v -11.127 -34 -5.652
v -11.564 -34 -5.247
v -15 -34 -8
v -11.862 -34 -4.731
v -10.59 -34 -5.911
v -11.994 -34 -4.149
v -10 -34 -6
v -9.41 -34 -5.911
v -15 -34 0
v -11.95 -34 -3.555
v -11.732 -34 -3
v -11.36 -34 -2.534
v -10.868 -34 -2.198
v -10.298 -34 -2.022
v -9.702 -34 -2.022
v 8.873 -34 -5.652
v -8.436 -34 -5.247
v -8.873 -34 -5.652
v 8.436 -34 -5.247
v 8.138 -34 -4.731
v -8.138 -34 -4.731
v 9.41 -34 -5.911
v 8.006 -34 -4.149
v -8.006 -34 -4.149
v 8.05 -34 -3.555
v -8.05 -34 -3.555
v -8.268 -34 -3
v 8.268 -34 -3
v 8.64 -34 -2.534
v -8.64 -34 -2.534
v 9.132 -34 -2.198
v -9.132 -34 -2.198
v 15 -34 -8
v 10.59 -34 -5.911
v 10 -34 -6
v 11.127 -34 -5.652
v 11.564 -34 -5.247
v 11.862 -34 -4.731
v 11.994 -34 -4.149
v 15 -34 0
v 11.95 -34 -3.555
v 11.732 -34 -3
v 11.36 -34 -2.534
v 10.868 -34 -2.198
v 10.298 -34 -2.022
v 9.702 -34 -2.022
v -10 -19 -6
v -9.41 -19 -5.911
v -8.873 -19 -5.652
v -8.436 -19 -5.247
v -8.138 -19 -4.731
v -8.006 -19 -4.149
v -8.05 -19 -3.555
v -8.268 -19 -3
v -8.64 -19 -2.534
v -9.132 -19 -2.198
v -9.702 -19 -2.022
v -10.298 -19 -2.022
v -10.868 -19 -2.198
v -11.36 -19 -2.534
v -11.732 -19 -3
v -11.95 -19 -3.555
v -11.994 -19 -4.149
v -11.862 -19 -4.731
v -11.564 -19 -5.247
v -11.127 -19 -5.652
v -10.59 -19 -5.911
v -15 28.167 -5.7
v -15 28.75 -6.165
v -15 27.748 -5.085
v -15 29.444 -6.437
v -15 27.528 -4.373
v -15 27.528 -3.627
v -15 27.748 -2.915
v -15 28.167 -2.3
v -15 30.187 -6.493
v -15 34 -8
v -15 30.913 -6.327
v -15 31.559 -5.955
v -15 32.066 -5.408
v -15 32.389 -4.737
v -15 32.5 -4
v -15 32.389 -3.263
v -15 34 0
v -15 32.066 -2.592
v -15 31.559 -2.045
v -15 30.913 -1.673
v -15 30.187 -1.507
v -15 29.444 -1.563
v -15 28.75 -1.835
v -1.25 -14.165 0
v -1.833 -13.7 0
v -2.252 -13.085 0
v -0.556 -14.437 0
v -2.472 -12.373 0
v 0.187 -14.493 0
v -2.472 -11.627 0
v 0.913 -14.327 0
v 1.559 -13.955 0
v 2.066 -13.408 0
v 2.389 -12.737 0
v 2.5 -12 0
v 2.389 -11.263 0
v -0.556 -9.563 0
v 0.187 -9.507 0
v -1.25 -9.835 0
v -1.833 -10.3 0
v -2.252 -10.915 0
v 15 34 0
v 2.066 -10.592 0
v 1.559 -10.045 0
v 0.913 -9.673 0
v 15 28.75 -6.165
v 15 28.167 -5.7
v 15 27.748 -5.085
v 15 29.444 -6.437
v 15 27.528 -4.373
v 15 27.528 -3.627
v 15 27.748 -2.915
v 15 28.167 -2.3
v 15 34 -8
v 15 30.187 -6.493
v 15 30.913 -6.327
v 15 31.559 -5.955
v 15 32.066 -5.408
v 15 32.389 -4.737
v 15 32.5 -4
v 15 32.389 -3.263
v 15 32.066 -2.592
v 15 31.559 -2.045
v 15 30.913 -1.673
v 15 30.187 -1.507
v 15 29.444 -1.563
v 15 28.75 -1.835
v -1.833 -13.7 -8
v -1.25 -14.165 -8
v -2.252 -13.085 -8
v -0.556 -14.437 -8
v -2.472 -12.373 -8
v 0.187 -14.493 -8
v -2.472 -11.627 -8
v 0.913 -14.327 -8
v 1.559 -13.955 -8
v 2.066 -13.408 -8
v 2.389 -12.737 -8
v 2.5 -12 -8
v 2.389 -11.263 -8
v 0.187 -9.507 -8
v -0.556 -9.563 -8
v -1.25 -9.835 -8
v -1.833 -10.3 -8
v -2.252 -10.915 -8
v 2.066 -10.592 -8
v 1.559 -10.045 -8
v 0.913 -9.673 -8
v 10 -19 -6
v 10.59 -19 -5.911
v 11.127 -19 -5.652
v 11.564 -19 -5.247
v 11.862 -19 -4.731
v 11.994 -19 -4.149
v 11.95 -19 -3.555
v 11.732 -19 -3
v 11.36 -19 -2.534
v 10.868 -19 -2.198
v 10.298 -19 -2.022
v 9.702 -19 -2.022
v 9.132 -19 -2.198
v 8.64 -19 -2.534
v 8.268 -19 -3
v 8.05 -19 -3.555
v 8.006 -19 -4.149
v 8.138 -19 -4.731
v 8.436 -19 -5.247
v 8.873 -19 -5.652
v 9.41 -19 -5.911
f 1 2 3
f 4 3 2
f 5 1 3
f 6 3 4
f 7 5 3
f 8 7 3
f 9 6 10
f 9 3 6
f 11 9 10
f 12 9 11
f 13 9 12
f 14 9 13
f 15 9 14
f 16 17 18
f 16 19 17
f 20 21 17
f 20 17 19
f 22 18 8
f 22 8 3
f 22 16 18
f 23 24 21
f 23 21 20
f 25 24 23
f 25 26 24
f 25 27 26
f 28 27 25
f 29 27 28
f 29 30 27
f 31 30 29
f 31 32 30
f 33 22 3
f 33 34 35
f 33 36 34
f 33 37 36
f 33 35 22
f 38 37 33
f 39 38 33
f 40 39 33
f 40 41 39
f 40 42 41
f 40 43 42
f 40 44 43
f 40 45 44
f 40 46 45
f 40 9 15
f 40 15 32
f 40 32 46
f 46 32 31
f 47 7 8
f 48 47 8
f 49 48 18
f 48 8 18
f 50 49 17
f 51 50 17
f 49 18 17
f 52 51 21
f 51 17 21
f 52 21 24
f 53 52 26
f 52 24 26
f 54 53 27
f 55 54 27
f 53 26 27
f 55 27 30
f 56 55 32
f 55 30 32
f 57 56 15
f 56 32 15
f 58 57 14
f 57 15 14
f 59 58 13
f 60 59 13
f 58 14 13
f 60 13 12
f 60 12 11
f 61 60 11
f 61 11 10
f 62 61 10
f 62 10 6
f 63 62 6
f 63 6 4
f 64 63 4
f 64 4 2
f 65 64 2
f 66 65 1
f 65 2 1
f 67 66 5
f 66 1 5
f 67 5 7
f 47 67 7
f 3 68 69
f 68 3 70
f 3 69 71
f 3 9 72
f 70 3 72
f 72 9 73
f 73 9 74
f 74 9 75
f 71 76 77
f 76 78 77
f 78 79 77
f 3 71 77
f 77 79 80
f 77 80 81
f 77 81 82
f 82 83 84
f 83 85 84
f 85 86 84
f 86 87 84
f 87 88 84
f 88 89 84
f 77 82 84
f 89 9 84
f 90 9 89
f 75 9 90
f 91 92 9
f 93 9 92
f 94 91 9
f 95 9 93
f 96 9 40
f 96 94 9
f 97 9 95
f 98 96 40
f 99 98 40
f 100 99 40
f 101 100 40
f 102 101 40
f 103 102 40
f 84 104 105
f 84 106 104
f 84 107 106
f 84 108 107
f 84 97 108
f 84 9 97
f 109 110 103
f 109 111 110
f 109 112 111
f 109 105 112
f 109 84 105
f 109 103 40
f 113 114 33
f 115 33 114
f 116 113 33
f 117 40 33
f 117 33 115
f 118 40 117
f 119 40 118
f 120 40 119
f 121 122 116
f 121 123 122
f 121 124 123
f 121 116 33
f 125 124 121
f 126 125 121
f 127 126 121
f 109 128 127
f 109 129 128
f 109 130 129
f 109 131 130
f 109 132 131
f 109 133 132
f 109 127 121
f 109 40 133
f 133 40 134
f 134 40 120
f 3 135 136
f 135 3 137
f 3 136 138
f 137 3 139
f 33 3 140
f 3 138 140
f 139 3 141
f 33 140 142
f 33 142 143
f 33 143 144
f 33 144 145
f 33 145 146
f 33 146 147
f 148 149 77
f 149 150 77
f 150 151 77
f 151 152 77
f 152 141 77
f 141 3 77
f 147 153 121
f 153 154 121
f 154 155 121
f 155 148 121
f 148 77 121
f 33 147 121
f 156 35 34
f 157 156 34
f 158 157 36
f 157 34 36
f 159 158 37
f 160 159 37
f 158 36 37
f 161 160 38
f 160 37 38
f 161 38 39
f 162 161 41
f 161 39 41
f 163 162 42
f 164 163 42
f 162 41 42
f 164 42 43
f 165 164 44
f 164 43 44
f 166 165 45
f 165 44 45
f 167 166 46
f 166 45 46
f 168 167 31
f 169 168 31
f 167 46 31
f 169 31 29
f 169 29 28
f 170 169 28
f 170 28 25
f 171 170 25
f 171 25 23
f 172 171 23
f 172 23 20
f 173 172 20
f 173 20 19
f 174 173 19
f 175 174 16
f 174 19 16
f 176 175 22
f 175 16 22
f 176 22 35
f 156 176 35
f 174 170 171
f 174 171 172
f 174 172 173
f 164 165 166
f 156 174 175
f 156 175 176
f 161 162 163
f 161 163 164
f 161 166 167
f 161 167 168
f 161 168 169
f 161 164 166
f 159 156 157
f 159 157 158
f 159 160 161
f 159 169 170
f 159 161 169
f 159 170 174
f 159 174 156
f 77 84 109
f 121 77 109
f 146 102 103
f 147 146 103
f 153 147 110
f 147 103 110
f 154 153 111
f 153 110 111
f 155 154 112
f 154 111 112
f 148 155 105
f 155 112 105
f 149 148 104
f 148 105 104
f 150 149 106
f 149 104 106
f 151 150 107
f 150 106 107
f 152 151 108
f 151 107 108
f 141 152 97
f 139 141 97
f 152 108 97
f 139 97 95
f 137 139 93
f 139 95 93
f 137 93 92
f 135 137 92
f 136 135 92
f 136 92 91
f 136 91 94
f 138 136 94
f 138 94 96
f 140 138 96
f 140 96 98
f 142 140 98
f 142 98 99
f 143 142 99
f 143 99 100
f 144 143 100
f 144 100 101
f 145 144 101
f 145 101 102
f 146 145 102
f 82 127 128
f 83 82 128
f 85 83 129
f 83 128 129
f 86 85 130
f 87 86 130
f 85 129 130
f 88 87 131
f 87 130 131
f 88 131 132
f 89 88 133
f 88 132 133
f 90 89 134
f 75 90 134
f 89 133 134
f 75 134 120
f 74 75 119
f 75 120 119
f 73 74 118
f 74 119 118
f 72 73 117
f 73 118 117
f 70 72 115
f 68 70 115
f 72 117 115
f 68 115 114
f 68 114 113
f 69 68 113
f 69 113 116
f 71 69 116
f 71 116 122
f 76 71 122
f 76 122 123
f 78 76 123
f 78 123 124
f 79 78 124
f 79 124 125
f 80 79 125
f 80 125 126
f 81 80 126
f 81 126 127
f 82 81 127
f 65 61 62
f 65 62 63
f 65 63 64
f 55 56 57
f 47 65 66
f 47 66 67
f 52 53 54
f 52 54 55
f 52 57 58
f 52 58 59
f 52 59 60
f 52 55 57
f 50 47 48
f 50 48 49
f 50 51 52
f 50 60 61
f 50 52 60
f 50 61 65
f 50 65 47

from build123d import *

# Parameters (mm, degrees)
CROQUIS1_W              = 30
CROQUIS1_H              = 68
SALIENTE_EXTRUIR1_DEPTH = 8
CROQUIS2_R              = 2.5
CORTAR_EXTRUIR1_DEPTH   = 47.043457733
CROQUIS3_R              = 2
CORTAR_EXTRUIR2_DEPTH   = 15
CROQUIS4_R              = 2.5
CORTAR_EXTRUIR3_DEPTH   = 39.013155617


with BuildPart() as part:
    # Croquis1 → Saliente-Extruir1 (new body)
    with BuildSketch(Plane.XY):
        Rectangle(CROQUIS1_W, CROQUIS1_H)
    extrude(amount=-SALIENTE_EXTRUIR1_DEPTH)

    # Croquis2 → Cortar-Extruir1 (cut, through all)
    with BuildSketch(Plane(origin=(15, 0, 0), x_dir=(0, 0, -1), z_dir=(1, 0, 0))):
        with Locations(Location((4, 30, 0), (0, 0, 90))):
            Circle(CROQUIS2_R)
    extrude(amount=-CORTAR_EXTRUIR1_DEPTH, mode=Mode.SUBTRACT)

    # Croquis3 → Cortar-Extruir2 (cut)
    with BuildSketch(Plane.XZ.offset(34)):
        with Locations(Location((-10, -4, 0), (0, 0, 270))):
            Circle(CROQUIS3_R)
        with Locations(Location((10, -4, 0), (0, 0, 270))):
            Circle(CROQUIS3_R)
    extrude(amount=-CORTAR_EXTRUIR2_DEPTH, mode=Mode.SUBTRACT)

    # Croquis4 → Cortar-Extruir3 (cut, through all)
    with BuildSketch(Plane.XY):
        with Locations((0, -12)):
            Circle(CROQUIS4_R)
    extrude(amount=-CORTAR_EXTRUIR3_DEPTH, mode=Mode.SUBTRACT)


solid = part.part
